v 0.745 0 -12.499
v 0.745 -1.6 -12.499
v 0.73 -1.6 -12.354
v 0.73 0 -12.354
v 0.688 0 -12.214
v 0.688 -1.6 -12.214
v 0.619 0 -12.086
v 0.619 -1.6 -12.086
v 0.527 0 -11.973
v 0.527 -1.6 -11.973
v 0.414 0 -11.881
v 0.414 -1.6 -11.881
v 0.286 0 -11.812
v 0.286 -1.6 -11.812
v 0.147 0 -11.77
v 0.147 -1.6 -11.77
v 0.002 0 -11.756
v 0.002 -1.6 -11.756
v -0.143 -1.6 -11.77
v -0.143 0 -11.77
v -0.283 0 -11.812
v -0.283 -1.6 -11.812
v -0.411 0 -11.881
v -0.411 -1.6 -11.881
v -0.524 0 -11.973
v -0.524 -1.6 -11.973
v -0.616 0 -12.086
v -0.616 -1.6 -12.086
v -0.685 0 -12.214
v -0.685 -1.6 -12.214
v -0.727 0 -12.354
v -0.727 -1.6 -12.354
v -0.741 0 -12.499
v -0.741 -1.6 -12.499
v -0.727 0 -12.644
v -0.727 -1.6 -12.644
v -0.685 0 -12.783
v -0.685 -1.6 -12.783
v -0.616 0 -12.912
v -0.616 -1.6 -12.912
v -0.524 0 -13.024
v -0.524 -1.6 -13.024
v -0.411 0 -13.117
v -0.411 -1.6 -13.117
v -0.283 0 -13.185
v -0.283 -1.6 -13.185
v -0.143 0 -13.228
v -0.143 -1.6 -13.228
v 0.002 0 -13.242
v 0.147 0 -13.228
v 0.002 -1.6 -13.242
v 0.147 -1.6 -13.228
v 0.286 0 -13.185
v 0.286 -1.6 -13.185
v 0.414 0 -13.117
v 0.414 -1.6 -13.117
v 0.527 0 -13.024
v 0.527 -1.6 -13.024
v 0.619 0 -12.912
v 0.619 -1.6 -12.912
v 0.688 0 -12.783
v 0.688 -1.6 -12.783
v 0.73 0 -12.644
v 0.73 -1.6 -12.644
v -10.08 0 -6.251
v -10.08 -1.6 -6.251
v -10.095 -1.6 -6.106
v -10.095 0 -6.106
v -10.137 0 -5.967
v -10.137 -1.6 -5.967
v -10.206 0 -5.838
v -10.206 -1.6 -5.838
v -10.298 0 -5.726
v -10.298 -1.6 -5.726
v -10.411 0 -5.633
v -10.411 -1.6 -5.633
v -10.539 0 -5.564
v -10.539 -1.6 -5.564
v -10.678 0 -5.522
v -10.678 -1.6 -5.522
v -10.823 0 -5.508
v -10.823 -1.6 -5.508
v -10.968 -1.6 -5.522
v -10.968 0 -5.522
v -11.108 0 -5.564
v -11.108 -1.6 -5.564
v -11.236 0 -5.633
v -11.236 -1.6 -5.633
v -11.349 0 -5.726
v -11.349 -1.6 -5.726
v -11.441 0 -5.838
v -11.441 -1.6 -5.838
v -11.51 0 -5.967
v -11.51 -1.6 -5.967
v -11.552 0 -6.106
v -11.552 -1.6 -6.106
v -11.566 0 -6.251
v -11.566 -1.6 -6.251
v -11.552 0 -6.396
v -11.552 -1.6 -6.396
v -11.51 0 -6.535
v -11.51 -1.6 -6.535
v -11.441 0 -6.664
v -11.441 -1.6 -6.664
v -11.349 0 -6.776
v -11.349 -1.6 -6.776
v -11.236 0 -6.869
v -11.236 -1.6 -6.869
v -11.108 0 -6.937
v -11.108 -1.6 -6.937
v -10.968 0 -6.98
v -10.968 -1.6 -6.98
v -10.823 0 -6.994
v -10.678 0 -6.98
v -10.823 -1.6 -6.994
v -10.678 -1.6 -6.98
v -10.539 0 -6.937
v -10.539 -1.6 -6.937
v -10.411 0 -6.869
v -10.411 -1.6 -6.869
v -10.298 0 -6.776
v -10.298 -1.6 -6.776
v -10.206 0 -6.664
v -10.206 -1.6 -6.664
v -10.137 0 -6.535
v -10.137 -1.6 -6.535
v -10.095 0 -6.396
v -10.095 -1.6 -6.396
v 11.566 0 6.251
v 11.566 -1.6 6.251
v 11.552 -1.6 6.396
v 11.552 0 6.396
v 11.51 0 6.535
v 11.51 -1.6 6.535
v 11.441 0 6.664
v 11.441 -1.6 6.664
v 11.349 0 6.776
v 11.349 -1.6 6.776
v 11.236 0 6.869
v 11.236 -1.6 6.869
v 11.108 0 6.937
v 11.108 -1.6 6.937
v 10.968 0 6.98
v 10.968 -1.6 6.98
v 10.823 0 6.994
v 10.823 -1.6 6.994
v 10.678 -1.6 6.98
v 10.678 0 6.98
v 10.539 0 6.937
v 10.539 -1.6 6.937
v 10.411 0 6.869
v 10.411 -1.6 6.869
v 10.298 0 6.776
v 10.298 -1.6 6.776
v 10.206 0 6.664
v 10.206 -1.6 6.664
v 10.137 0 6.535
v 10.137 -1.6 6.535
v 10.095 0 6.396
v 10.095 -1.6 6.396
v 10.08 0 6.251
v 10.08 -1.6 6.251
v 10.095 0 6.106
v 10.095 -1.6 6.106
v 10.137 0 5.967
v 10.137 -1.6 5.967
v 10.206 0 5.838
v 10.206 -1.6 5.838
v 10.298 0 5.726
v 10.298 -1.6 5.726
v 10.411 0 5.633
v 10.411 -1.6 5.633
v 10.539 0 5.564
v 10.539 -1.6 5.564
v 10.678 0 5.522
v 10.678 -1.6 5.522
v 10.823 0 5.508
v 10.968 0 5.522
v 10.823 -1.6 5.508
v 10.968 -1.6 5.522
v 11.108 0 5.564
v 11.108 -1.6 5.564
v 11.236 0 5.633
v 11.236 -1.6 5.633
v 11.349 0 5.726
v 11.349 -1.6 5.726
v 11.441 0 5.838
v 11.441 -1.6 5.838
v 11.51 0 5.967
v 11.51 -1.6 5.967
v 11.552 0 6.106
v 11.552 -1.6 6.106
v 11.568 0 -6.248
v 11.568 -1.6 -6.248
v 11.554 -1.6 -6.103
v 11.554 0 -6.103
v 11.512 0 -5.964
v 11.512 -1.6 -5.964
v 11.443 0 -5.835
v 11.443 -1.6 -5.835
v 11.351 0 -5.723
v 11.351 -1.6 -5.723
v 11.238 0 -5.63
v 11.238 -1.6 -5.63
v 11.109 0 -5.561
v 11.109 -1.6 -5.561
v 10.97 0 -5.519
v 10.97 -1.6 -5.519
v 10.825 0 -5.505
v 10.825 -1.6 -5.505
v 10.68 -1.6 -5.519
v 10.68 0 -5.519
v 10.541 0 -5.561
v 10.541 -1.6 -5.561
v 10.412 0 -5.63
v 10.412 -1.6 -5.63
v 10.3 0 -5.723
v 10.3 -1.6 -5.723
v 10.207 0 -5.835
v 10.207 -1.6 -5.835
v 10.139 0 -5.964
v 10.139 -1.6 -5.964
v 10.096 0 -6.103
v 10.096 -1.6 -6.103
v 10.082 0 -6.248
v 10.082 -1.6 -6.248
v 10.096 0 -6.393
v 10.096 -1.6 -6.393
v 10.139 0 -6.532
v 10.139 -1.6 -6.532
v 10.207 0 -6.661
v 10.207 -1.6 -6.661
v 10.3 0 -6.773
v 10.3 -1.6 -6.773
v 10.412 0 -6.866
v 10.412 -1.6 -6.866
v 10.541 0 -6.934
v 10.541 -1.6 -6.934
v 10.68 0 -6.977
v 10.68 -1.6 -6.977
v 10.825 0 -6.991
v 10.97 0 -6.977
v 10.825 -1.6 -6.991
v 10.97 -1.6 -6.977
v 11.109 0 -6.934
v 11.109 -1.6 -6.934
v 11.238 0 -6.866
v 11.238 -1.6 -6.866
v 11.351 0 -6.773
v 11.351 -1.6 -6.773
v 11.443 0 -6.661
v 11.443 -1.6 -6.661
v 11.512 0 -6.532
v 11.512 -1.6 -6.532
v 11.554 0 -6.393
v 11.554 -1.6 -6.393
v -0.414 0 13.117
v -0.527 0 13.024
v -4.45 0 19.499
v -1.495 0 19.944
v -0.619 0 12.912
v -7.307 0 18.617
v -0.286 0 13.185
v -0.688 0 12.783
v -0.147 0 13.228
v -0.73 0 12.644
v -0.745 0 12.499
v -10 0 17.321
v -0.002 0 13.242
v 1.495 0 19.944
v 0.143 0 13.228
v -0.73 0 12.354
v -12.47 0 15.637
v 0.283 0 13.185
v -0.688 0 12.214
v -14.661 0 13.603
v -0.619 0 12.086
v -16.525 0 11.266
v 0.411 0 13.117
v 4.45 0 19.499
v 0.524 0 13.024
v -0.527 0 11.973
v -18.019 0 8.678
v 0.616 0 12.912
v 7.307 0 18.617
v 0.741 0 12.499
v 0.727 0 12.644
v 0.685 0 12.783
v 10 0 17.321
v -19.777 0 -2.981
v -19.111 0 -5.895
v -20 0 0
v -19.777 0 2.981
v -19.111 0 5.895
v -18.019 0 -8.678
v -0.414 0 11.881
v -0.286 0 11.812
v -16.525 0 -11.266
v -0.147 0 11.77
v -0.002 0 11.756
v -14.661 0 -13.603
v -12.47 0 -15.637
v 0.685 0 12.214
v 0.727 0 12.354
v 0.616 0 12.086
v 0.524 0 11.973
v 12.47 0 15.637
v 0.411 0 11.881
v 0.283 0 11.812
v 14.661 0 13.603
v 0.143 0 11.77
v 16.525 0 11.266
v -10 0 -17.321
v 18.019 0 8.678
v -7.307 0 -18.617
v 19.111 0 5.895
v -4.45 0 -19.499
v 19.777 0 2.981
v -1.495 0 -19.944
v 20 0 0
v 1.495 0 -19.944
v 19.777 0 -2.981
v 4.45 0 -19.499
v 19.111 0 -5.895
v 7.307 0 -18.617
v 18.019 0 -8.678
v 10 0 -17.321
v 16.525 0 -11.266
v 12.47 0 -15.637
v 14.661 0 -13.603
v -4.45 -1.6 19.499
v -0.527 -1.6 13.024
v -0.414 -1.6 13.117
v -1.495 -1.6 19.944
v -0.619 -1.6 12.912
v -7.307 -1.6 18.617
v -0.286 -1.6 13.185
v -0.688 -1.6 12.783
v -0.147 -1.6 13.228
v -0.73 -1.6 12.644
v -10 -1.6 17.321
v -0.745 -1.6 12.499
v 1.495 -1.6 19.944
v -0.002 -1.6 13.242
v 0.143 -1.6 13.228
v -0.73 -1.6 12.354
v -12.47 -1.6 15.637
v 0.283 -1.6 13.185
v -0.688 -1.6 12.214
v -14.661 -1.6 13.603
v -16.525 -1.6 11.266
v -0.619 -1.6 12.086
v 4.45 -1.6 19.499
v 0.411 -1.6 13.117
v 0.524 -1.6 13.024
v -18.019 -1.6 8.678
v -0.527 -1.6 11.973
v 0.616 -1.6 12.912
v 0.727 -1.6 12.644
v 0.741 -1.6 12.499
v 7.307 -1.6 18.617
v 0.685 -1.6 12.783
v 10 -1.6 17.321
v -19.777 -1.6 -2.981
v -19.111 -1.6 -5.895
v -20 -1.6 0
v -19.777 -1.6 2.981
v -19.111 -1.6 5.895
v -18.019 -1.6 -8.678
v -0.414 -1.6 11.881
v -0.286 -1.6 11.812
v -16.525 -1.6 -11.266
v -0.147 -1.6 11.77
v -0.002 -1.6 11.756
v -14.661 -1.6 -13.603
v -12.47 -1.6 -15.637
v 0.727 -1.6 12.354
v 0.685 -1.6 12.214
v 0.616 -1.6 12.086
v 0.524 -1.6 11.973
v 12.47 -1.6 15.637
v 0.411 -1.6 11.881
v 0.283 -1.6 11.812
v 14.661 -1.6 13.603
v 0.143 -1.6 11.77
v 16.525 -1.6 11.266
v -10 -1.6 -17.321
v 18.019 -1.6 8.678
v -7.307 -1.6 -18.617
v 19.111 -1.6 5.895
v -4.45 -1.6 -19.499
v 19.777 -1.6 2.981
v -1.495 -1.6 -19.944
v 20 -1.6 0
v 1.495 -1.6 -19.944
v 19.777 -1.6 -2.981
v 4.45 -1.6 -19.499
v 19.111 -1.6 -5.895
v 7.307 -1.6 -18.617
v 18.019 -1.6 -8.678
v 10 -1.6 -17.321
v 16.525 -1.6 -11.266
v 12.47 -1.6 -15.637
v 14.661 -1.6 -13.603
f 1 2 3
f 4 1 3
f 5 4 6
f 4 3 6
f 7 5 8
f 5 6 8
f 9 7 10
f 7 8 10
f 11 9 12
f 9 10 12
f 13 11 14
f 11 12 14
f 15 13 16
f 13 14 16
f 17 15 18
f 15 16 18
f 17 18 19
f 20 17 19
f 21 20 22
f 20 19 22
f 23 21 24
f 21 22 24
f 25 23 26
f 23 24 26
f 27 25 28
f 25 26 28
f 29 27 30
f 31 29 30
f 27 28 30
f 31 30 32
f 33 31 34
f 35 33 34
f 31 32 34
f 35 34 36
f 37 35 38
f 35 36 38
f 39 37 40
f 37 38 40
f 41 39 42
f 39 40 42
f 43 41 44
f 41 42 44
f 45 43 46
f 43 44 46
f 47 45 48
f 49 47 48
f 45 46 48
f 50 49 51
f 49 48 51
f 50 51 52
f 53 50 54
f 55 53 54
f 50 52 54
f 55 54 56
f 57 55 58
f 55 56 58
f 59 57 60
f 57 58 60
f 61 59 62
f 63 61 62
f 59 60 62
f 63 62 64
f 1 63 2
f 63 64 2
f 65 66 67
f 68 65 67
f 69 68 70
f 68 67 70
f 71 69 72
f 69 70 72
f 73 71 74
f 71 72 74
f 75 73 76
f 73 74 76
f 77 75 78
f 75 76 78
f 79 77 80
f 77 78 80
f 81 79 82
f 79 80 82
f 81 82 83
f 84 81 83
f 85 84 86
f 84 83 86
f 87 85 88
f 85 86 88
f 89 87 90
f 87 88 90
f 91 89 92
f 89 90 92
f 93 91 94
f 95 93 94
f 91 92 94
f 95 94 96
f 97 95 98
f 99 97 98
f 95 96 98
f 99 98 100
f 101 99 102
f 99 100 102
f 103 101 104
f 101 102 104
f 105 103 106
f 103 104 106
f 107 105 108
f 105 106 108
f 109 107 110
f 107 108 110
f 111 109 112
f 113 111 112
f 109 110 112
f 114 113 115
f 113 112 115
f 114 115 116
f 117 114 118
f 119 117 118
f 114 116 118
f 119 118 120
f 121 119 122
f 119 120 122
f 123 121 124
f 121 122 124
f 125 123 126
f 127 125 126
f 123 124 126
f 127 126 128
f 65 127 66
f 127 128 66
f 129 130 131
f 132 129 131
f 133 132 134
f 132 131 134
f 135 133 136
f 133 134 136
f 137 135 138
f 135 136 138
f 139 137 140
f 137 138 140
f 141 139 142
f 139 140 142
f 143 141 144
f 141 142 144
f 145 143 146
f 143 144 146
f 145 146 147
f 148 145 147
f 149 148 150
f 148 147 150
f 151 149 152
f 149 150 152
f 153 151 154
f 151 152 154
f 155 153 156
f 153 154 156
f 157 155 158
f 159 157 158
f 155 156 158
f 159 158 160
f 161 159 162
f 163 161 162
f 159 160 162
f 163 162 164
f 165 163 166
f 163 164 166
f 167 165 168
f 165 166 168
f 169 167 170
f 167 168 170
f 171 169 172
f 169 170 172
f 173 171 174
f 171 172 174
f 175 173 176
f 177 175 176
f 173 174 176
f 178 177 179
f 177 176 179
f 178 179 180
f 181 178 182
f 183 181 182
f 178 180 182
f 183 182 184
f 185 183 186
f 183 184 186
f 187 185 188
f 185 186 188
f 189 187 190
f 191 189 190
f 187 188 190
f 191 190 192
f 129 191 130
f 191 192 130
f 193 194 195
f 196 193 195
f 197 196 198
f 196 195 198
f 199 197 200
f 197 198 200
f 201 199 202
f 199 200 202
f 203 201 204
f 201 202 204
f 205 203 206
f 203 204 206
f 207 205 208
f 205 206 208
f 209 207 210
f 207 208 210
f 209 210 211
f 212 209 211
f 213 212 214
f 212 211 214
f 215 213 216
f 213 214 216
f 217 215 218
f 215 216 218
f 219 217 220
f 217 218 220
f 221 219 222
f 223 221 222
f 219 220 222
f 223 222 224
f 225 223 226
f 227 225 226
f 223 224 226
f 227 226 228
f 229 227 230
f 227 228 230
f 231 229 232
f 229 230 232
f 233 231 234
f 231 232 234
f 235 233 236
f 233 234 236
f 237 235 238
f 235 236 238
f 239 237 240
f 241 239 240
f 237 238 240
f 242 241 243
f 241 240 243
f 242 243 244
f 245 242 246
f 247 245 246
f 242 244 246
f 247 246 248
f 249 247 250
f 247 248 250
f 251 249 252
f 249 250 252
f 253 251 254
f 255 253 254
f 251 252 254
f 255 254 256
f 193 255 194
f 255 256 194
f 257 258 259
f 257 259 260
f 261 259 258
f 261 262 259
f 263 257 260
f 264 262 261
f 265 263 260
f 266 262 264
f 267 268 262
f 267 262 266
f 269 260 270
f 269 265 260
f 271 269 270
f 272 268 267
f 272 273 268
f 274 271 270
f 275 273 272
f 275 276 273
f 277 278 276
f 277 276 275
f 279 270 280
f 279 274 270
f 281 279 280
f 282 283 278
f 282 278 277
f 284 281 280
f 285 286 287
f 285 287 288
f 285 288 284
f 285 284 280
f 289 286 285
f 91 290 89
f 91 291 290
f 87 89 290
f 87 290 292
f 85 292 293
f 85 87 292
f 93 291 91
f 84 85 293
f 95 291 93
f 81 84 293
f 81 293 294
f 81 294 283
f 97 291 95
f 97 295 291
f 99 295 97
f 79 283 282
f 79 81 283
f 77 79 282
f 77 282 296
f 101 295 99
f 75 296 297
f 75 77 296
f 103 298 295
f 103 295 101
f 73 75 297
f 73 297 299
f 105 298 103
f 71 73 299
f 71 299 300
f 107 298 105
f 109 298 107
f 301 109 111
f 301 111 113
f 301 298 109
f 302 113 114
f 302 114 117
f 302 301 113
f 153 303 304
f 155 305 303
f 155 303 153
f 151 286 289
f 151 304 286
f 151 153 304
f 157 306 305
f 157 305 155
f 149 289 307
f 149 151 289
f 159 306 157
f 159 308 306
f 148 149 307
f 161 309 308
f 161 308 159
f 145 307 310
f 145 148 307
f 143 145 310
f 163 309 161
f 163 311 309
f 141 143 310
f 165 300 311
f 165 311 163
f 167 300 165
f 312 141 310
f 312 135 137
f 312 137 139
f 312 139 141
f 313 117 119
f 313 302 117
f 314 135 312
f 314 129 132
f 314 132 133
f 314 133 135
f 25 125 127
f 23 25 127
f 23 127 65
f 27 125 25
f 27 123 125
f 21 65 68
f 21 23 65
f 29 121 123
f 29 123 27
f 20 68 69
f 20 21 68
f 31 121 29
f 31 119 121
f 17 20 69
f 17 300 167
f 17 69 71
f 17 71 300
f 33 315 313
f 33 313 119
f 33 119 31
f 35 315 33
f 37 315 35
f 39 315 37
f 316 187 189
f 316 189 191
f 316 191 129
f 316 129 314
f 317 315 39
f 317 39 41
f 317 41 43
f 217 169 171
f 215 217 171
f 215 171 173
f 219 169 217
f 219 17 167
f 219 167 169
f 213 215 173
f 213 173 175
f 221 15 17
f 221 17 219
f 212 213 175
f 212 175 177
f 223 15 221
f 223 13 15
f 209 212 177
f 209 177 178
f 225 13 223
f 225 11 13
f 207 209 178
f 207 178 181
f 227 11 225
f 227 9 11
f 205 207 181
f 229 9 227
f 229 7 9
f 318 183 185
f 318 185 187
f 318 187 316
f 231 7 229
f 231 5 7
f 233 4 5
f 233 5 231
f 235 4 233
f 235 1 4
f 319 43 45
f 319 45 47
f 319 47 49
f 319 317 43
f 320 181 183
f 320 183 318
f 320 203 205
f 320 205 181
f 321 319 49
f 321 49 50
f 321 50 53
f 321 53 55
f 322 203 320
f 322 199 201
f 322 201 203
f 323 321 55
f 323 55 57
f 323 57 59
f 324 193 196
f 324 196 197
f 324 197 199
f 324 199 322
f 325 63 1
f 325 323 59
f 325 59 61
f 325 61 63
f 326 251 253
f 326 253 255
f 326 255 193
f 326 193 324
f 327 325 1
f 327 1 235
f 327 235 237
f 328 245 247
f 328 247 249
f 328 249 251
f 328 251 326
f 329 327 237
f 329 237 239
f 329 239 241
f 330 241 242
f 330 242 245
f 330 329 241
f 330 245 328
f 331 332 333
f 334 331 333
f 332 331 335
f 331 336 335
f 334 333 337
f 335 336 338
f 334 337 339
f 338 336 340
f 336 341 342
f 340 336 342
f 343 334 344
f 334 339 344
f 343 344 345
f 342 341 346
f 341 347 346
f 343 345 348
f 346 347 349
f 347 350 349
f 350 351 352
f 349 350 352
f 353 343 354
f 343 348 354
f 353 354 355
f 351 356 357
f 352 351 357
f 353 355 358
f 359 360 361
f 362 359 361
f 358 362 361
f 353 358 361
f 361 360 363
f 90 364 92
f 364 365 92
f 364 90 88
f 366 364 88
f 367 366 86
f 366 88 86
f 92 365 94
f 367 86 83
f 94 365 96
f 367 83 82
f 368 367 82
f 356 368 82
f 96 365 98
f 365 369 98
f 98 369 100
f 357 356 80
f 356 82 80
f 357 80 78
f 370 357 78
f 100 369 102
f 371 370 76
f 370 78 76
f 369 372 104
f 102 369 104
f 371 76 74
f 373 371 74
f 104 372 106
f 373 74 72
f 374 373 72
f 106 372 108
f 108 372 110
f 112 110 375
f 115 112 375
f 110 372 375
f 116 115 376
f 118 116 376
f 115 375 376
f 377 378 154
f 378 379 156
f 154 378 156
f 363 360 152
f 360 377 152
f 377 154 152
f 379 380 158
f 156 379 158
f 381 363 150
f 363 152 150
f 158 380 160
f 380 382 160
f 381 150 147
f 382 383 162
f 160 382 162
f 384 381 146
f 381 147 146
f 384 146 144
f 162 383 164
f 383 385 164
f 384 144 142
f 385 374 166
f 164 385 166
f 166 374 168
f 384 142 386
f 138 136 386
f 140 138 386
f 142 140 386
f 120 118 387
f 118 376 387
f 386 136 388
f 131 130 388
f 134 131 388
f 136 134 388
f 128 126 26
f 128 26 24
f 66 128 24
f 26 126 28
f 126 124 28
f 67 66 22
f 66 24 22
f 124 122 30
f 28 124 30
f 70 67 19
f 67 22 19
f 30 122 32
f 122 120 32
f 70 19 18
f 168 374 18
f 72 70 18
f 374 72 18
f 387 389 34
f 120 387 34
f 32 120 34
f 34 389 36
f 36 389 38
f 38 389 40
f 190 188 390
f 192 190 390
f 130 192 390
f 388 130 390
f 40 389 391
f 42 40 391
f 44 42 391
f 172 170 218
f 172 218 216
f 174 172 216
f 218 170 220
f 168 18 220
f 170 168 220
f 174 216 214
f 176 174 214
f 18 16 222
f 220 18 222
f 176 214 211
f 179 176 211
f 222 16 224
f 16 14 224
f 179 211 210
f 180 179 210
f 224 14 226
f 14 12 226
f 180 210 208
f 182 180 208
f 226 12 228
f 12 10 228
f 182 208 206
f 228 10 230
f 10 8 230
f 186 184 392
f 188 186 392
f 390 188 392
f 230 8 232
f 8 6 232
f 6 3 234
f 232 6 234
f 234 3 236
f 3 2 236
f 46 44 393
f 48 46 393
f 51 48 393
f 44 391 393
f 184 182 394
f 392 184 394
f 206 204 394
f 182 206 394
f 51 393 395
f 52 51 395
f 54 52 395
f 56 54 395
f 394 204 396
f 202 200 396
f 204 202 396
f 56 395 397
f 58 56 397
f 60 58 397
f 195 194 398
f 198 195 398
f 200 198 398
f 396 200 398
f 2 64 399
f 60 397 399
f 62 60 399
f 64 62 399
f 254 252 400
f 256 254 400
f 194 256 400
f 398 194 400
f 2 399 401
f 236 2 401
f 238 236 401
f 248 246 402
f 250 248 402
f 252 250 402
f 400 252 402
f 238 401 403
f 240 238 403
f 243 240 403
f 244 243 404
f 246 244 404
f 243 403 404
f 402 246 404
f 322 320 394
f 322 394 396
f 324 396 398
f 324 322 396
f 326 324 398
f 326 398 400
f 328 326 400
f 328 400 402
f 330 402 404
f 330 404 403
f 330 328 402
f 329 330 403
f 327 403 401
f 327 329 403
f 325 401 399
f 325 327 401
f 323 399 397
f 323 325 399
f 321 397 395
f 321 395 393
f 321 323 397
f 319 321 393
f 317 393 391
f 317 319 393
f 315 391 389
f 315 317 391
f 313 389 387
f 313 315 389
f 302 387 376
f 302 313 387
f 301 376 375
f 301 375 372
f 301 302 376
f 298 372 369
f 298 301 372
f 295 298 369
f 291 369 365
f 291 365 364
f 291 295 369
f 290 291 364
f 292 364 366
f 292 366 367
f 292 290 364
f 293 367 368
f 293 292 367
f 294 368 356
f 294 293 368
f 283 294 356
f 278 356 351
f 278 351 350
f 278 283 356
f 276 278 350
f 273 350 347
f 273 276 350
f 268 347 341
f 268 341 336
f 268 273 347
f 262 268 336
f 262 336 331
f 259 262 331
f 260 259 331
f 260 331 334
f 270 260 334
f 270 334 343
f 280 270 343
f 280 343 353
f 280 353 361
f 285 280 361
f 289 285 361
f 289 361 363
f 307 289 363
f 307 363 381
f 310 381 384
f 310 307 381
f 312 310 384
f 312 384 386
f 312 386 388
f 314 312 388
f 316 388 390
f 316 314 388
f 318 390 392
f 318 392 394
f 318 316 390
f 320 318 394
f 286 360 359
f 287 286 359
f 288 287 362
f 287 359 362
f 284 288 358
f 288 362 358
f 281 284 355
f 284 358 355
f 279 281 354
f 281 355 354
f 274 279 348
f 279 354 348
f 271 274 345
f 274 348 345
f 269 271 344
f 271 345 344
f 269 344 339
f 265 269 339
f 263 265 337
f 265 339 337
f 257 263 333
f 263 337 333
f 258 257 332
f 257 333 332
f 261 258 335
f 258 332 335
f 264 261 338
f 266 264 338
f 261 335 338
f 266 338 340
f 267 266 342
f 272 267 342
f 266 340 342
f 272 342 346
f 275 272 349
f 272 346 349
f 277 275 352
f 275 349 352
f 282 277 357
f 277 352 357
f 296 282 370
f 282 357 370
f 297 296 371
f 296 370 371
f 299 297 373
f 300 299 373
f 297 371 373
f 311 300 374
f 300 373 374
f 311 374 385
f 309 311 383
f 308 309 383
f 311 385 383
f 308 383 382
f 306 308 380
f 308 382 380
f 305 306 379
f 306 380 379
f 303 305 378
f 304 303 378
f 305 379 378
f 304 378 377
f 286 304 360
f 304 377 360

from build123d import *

# Parameters (mm, degrees)
SKETCH1_R           = 20
BOSS_EXTRUDE1_DEPTH = 1.6
SKETCH2_R           = 0.743
CUT_EXTRUDE2_DEPTH  = 1.6


with BuildPart() as part:
    # Sketch1 → Boss-Extrude1 (new body)
    with BuildSketch(Plane(origin=(0, 0, 0), x_dir=(1, 0, 0), z_dir=(0, 1, 0))):
        Circle(SKETCH1_R)
    extrude(amount=-BOSS_EXTRUDE1_DEPTH)

    # Sketch2 → Cut-Extrude2 (cut)
    with BuildSketch(Plane.XZ.offset(1.6)):
        with Locations((-0.00171005, 12.498814086)):
            Circle(SKETCH2_R)
        with Locations((10.823435491, 6.25088799)):
            Circle(SKETCH2_R)
        with Locations((10.825145541, -6.247926096)):
            Circle(SKETCH2_R)
        with Locations((0.00171005, -12.498814086)):
            Circle(SKETCH2_R)
        with Locations((-10.823435491, -6.25088799)):
            Circle(SKETCH2_R)
    extrude(amount=-CUT_EXTRUDE2_DEPTH, mode=Mode.SUBTRACT)


solid = part.part
